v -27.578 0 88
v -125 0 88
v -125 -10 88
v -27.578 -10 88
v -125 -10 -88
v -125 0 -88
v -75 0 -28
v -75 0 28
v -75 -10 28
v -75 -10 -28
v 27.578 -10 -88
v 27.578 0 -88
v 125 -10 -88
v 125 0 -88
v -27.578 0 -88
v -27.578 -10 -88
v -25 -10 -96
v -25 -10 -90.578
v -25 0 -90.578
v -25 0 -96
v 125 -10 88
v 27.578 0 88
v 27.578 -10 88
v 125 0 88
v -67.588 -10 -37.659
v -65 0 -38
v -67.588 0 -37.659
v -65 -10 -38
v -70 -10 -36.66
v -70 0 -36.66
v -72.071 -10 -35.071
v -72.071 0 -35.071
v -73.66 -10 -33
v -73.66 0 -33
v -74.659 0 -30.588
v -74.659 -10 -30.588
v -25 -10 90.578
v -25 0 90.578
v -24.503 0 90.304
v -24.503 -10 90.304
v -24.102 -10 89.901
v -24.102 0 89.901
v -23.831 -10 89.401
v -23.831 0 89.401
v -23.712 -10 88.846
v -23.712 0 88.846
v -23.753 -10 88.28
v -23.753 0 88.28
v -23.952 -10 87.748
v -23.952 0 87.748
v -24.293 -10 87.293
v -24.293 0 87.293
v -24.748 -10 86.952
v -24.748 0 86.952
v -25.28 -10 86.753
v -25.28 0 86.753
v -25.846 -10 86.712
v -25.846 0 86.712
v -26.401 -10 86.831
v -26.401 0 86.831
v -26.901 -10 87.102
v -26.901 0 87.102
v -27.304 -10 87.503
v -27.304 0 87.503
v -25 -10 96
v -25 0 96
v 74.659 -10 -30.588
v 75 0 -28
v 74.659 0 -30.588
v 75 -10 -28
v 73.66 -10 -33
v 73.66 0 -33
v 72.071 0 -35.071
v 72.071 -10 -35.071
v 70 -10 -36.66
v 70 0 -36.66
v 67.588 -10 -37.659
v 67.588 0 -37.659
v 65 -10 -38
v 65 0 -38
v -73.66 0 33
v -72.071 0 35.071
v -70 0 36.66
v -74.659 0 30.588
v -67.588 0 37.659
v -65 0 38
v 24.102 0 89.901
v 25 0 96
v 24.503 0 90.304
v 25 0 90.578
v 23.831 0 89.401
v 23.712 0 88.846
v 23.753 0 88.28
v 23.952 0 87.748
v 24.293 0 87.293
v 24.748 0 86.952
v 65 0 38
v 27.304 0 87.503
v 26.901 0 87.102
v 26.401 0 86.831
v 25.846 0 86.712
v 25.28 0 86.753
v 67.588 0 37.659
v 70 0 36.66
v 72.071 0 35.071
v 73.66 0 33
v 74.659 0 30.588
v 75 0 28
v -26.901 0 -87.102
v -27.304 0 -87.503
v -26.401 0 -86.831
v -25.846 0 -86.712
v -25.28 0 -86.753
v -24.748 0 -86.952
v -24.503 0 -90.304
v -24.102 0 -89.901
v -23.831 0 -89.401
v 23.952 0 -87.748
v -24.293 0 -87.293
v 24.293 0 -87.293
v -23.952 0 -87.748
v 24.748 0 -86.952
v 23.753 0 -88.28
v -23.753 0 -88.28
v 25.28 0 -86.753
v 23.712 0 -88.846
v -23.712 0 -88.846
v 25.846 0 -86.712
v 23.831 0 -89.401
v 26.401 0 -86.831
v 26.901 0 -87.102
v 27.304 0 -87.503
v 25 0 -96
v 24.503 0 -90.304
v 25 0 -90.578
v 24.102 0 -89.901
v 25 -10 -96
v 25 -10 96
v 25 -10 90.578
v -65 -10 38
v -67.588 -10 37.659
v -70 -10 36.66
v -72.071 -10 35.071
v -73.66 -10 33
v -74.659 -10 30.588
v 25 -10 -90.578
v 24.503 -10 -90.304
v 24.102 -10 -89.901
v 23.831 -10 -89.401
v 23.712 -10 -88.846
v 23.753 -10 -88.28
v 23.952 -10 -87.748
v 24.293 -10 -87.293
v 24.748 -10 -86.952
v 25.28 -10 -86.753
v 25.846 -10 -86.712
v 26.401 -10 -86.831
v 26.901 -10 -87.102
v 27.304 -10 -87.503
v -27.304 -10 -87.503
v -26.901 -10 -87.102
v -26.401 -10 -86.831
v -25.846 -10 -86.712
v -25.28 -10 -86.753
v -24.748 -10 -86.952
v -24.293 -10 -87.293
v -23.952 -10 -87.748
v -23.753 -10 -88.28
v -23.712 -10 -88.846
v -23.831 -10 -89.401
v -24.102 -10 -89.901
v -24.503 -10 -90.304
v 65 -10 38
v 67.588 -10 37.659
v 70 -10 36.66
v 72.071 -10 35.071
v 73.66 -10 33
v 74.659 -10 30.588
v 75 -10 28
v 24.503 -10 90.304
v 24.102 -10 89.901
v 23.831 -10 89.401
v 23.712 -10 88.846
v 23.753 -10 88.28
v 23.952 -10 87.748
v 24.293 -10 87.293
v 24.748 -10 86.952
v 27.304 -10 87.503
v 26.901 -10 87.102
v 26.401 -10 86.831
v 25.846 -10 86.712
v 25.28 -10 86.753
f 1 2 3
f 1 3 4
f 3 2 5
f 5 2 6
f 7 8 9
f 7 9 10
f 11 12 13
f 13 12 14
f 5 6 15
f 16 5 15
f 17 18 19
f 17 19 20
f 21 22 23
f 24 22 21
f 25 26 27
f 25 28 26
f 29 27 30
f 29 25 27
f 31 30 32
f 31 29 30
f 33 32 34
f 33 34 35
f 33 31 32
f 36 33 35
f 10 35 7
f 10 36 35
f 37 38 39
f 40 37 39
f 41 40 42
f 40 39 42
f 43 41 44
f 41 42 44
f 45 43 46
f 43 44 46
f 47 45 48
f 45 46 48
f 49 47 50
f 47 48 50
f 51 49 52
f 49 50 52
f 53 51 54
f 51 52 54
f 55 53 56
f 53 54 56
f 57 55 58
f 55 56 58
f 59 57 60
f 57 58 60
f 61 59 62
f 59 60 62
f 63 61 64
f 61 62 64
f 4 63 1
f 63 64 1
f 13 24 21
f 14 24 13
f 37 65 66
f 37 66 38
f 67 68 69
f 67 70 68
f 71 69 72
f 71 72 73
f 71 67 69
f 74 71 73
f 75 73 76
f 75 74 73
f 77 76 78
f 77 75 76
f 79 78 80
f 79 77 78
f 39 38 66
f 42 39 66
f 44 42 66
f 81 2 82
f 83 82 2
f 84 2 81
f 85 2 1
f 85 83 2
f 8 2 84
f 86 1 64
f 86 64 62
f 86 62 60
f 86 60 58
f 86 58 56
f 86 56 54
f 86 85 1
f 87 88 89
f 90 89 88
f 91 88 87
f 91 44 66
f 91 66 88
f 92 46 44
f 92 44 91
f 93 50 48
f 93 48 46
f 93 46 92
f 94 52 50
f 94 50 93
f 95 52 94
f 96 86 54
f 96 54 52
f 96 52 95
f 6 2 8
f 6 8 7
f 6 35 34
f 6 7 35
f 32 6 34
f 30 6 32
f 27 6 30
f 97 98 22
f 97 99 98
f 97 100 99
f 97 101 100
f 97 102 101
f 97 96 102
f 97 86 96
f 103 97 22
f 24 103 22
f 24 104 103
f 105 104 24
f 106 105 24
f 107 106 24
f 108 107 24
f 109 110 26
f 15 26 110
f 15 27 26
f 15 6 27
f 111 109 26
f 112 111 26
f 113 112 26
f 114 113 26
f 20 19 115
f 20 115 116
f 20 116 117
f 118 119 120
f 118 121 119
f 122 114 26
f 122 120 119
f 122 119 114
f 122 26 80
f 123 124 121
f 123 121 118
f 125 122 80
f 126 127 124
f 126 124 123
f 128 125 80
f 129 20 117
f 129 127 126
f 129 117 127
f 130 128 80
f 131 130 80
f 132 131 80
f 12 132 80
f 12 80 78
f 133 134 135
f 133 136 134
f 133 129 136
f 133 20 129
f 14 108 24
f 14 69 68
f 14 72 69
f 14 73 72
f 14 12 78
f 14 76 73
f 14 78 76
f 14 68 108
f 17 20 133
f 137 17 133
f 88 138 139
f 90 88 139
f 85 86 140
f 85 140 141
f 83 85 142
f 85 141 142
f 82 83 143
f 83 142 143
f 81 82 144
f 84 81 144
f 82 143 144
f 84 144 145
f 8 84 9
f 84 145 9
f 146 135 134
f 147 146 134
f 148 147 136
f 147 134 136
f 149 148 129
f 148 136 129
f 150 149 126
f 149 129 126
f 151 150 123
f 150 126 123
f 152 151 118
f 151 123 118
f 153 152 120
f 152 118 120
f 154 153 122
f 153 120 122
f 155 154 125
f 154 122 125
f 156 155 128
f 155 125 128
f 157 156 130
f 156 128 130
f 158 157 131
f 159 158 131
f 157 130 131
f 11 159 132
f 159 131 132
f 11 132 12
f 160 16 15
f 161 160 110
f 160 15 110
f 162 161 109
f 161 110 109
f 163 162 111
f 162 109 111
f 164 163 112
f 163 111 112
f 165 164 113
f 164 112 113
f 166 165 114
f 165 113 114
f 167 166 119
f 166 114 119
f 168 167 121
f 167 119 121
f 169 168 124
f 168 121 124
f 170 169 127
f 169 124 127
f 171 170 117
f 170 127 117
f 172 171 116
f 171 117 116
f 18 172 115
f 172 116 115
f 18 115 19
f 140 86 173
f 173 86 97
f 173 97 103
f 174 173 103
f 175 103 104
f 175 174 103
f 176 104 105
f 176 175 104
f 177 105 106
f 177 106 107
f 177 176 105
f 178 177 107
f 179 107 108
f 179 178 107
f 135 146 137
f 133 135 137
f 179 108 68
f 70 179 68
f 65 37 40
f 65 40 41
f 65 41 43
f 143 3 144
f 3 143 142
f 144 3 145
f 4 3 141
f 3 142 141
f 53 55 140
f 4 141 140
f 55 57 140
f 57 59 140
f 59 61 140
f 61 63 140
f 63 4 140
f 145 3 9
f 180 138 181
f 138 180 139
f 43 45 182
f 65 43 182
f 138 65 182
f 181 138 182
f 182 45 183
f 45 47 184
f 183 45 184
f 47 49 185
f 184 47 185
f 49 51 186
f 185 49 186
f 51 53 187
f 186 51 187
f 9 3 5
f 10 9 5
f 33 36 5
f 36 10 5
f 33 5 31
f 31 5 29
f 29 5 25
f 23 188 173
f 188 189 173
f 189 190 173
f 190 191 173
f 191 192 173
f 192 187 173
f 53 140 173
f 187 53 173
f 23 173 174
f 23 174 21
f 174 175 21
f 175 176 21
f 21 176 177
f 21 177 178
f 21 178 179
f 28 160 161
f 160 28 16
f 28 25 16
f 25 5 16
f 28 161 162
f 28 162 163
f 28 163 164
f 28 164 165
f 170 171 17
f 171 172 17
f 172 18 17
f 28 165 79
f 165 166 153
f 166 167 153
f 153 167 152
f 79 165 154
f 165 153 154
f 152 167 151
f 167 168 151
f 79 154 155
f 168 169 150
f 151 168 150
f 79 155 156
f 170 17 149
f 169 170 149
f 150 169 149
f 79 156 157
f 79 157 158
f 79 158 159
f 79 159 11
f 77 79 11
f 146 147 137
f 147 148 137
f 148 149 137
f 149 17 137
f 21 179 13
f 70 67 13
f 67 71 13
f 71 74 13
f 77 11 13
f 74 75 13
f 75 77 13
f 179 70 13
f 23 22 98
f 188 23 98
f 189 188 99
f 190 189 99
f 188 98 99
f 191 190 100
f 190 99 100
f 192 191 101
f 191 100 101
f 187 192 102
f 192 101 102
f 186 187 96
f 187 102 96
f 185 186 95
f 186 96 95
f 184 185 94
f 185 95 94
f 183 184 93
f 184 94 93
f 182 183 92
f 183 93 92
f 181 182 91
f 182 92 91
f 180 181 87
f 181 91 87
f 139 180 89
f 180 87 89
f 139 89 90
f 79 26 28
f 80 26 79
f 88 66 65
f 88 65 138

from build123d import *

# Parameters (mm, degrees)
SKETCH1_W           = 250
SKETCH1_H           = 176
BASE_FLANGE1_DEPTH  = 10
SKETCH6_W           = 50
SKETCH6_H           = 8
BOSS_EXTRUDE1_DEPTH = 10
SKETCH7_R           = 2
CUT_EXTRUDE1_DEPTH  = 158.927198417
SKETCH8_W           = 150
SKETCH8_H           = 76
CUT_EXTRUDE2_DEPTH  = 158.927198417
FILLET1_R           = 10


# Sheet-metal steps are written as plain solids
with BuildPart() as part:
    # Sketch1 → Base-Flange1 (new body)
    with BuildSketch(Plane(origin=(0, 0, 0), x_dir=(1, 0, 0), z_dir=(0, 1, 0))):
        Rectangle(SKETCH1_W, SKETCH1_H)
    extrude(amount=-BASE_FLANGE1_DEPTH)

    # Sketch6 → Boss-Extrude1 (add)
    with BuildSketch(Plane(origin=(0, 0, 0), x_dir=(1, 0, 0), z_dir=(0, 1, 0))):
        with Locations((0, 92)):
            Rectangle(SKETCH6_W, SKETCH6_H)
        with Locations((0, -92)):
            Rectangle(SKETCH6_W, SKETCH6_H)
    extrude(amount=-BOSS_EXTRUDE1_DEPTH)

    # Sketch7 → Cut-Extrude1 (cut, through all)
    with BuildSketch(Plane(origin=(0, 0, 0), x_dir=(1, 0, 0), z_dir=(0, 1, 0))):
        with Locations((25.707106781, 88.707106781)):
            Circle(SKETCH7_R)
        with Locations((-25.707106781, 88.707106781)):
            Circle(SKETCH7_R)
        with Locations((-25.707106781, -88.707106781)):
            Circle(SKETCH7_R)
        with Locations((25.707106781, -88.707106781)):
            Circle(SKETCH7_R)
    extrude(amount=-CUT_EXTRUDE1_DEPTH, mode=Mode.SUBTRACT)

    # Sketch8 → Cut-Extrude2 (cut, through all)
    with BuildSketch(Plane(origin=(0, 0, 0), x_dir=(1, 0, 0), z_dir=(0, 1, 0))):
        Rectangle(SKETCH8_W, SKETCH8_H)
    extrude(amount=-CUT_EXTRUDE2_DEPTH, mode=Mode.SUBTRACT)

    # Fillet1
    fillet1_edges = [part.edges().sort_by_distance(p)[0] for p in [
        (-75, -5, 38),
        (-75, -5, -38),
        (75, -5, -38),
        (75, -5, 38),
    ]]
    fillet(fillet1_edges, radius=FILLET1_R)


solid = part.part
